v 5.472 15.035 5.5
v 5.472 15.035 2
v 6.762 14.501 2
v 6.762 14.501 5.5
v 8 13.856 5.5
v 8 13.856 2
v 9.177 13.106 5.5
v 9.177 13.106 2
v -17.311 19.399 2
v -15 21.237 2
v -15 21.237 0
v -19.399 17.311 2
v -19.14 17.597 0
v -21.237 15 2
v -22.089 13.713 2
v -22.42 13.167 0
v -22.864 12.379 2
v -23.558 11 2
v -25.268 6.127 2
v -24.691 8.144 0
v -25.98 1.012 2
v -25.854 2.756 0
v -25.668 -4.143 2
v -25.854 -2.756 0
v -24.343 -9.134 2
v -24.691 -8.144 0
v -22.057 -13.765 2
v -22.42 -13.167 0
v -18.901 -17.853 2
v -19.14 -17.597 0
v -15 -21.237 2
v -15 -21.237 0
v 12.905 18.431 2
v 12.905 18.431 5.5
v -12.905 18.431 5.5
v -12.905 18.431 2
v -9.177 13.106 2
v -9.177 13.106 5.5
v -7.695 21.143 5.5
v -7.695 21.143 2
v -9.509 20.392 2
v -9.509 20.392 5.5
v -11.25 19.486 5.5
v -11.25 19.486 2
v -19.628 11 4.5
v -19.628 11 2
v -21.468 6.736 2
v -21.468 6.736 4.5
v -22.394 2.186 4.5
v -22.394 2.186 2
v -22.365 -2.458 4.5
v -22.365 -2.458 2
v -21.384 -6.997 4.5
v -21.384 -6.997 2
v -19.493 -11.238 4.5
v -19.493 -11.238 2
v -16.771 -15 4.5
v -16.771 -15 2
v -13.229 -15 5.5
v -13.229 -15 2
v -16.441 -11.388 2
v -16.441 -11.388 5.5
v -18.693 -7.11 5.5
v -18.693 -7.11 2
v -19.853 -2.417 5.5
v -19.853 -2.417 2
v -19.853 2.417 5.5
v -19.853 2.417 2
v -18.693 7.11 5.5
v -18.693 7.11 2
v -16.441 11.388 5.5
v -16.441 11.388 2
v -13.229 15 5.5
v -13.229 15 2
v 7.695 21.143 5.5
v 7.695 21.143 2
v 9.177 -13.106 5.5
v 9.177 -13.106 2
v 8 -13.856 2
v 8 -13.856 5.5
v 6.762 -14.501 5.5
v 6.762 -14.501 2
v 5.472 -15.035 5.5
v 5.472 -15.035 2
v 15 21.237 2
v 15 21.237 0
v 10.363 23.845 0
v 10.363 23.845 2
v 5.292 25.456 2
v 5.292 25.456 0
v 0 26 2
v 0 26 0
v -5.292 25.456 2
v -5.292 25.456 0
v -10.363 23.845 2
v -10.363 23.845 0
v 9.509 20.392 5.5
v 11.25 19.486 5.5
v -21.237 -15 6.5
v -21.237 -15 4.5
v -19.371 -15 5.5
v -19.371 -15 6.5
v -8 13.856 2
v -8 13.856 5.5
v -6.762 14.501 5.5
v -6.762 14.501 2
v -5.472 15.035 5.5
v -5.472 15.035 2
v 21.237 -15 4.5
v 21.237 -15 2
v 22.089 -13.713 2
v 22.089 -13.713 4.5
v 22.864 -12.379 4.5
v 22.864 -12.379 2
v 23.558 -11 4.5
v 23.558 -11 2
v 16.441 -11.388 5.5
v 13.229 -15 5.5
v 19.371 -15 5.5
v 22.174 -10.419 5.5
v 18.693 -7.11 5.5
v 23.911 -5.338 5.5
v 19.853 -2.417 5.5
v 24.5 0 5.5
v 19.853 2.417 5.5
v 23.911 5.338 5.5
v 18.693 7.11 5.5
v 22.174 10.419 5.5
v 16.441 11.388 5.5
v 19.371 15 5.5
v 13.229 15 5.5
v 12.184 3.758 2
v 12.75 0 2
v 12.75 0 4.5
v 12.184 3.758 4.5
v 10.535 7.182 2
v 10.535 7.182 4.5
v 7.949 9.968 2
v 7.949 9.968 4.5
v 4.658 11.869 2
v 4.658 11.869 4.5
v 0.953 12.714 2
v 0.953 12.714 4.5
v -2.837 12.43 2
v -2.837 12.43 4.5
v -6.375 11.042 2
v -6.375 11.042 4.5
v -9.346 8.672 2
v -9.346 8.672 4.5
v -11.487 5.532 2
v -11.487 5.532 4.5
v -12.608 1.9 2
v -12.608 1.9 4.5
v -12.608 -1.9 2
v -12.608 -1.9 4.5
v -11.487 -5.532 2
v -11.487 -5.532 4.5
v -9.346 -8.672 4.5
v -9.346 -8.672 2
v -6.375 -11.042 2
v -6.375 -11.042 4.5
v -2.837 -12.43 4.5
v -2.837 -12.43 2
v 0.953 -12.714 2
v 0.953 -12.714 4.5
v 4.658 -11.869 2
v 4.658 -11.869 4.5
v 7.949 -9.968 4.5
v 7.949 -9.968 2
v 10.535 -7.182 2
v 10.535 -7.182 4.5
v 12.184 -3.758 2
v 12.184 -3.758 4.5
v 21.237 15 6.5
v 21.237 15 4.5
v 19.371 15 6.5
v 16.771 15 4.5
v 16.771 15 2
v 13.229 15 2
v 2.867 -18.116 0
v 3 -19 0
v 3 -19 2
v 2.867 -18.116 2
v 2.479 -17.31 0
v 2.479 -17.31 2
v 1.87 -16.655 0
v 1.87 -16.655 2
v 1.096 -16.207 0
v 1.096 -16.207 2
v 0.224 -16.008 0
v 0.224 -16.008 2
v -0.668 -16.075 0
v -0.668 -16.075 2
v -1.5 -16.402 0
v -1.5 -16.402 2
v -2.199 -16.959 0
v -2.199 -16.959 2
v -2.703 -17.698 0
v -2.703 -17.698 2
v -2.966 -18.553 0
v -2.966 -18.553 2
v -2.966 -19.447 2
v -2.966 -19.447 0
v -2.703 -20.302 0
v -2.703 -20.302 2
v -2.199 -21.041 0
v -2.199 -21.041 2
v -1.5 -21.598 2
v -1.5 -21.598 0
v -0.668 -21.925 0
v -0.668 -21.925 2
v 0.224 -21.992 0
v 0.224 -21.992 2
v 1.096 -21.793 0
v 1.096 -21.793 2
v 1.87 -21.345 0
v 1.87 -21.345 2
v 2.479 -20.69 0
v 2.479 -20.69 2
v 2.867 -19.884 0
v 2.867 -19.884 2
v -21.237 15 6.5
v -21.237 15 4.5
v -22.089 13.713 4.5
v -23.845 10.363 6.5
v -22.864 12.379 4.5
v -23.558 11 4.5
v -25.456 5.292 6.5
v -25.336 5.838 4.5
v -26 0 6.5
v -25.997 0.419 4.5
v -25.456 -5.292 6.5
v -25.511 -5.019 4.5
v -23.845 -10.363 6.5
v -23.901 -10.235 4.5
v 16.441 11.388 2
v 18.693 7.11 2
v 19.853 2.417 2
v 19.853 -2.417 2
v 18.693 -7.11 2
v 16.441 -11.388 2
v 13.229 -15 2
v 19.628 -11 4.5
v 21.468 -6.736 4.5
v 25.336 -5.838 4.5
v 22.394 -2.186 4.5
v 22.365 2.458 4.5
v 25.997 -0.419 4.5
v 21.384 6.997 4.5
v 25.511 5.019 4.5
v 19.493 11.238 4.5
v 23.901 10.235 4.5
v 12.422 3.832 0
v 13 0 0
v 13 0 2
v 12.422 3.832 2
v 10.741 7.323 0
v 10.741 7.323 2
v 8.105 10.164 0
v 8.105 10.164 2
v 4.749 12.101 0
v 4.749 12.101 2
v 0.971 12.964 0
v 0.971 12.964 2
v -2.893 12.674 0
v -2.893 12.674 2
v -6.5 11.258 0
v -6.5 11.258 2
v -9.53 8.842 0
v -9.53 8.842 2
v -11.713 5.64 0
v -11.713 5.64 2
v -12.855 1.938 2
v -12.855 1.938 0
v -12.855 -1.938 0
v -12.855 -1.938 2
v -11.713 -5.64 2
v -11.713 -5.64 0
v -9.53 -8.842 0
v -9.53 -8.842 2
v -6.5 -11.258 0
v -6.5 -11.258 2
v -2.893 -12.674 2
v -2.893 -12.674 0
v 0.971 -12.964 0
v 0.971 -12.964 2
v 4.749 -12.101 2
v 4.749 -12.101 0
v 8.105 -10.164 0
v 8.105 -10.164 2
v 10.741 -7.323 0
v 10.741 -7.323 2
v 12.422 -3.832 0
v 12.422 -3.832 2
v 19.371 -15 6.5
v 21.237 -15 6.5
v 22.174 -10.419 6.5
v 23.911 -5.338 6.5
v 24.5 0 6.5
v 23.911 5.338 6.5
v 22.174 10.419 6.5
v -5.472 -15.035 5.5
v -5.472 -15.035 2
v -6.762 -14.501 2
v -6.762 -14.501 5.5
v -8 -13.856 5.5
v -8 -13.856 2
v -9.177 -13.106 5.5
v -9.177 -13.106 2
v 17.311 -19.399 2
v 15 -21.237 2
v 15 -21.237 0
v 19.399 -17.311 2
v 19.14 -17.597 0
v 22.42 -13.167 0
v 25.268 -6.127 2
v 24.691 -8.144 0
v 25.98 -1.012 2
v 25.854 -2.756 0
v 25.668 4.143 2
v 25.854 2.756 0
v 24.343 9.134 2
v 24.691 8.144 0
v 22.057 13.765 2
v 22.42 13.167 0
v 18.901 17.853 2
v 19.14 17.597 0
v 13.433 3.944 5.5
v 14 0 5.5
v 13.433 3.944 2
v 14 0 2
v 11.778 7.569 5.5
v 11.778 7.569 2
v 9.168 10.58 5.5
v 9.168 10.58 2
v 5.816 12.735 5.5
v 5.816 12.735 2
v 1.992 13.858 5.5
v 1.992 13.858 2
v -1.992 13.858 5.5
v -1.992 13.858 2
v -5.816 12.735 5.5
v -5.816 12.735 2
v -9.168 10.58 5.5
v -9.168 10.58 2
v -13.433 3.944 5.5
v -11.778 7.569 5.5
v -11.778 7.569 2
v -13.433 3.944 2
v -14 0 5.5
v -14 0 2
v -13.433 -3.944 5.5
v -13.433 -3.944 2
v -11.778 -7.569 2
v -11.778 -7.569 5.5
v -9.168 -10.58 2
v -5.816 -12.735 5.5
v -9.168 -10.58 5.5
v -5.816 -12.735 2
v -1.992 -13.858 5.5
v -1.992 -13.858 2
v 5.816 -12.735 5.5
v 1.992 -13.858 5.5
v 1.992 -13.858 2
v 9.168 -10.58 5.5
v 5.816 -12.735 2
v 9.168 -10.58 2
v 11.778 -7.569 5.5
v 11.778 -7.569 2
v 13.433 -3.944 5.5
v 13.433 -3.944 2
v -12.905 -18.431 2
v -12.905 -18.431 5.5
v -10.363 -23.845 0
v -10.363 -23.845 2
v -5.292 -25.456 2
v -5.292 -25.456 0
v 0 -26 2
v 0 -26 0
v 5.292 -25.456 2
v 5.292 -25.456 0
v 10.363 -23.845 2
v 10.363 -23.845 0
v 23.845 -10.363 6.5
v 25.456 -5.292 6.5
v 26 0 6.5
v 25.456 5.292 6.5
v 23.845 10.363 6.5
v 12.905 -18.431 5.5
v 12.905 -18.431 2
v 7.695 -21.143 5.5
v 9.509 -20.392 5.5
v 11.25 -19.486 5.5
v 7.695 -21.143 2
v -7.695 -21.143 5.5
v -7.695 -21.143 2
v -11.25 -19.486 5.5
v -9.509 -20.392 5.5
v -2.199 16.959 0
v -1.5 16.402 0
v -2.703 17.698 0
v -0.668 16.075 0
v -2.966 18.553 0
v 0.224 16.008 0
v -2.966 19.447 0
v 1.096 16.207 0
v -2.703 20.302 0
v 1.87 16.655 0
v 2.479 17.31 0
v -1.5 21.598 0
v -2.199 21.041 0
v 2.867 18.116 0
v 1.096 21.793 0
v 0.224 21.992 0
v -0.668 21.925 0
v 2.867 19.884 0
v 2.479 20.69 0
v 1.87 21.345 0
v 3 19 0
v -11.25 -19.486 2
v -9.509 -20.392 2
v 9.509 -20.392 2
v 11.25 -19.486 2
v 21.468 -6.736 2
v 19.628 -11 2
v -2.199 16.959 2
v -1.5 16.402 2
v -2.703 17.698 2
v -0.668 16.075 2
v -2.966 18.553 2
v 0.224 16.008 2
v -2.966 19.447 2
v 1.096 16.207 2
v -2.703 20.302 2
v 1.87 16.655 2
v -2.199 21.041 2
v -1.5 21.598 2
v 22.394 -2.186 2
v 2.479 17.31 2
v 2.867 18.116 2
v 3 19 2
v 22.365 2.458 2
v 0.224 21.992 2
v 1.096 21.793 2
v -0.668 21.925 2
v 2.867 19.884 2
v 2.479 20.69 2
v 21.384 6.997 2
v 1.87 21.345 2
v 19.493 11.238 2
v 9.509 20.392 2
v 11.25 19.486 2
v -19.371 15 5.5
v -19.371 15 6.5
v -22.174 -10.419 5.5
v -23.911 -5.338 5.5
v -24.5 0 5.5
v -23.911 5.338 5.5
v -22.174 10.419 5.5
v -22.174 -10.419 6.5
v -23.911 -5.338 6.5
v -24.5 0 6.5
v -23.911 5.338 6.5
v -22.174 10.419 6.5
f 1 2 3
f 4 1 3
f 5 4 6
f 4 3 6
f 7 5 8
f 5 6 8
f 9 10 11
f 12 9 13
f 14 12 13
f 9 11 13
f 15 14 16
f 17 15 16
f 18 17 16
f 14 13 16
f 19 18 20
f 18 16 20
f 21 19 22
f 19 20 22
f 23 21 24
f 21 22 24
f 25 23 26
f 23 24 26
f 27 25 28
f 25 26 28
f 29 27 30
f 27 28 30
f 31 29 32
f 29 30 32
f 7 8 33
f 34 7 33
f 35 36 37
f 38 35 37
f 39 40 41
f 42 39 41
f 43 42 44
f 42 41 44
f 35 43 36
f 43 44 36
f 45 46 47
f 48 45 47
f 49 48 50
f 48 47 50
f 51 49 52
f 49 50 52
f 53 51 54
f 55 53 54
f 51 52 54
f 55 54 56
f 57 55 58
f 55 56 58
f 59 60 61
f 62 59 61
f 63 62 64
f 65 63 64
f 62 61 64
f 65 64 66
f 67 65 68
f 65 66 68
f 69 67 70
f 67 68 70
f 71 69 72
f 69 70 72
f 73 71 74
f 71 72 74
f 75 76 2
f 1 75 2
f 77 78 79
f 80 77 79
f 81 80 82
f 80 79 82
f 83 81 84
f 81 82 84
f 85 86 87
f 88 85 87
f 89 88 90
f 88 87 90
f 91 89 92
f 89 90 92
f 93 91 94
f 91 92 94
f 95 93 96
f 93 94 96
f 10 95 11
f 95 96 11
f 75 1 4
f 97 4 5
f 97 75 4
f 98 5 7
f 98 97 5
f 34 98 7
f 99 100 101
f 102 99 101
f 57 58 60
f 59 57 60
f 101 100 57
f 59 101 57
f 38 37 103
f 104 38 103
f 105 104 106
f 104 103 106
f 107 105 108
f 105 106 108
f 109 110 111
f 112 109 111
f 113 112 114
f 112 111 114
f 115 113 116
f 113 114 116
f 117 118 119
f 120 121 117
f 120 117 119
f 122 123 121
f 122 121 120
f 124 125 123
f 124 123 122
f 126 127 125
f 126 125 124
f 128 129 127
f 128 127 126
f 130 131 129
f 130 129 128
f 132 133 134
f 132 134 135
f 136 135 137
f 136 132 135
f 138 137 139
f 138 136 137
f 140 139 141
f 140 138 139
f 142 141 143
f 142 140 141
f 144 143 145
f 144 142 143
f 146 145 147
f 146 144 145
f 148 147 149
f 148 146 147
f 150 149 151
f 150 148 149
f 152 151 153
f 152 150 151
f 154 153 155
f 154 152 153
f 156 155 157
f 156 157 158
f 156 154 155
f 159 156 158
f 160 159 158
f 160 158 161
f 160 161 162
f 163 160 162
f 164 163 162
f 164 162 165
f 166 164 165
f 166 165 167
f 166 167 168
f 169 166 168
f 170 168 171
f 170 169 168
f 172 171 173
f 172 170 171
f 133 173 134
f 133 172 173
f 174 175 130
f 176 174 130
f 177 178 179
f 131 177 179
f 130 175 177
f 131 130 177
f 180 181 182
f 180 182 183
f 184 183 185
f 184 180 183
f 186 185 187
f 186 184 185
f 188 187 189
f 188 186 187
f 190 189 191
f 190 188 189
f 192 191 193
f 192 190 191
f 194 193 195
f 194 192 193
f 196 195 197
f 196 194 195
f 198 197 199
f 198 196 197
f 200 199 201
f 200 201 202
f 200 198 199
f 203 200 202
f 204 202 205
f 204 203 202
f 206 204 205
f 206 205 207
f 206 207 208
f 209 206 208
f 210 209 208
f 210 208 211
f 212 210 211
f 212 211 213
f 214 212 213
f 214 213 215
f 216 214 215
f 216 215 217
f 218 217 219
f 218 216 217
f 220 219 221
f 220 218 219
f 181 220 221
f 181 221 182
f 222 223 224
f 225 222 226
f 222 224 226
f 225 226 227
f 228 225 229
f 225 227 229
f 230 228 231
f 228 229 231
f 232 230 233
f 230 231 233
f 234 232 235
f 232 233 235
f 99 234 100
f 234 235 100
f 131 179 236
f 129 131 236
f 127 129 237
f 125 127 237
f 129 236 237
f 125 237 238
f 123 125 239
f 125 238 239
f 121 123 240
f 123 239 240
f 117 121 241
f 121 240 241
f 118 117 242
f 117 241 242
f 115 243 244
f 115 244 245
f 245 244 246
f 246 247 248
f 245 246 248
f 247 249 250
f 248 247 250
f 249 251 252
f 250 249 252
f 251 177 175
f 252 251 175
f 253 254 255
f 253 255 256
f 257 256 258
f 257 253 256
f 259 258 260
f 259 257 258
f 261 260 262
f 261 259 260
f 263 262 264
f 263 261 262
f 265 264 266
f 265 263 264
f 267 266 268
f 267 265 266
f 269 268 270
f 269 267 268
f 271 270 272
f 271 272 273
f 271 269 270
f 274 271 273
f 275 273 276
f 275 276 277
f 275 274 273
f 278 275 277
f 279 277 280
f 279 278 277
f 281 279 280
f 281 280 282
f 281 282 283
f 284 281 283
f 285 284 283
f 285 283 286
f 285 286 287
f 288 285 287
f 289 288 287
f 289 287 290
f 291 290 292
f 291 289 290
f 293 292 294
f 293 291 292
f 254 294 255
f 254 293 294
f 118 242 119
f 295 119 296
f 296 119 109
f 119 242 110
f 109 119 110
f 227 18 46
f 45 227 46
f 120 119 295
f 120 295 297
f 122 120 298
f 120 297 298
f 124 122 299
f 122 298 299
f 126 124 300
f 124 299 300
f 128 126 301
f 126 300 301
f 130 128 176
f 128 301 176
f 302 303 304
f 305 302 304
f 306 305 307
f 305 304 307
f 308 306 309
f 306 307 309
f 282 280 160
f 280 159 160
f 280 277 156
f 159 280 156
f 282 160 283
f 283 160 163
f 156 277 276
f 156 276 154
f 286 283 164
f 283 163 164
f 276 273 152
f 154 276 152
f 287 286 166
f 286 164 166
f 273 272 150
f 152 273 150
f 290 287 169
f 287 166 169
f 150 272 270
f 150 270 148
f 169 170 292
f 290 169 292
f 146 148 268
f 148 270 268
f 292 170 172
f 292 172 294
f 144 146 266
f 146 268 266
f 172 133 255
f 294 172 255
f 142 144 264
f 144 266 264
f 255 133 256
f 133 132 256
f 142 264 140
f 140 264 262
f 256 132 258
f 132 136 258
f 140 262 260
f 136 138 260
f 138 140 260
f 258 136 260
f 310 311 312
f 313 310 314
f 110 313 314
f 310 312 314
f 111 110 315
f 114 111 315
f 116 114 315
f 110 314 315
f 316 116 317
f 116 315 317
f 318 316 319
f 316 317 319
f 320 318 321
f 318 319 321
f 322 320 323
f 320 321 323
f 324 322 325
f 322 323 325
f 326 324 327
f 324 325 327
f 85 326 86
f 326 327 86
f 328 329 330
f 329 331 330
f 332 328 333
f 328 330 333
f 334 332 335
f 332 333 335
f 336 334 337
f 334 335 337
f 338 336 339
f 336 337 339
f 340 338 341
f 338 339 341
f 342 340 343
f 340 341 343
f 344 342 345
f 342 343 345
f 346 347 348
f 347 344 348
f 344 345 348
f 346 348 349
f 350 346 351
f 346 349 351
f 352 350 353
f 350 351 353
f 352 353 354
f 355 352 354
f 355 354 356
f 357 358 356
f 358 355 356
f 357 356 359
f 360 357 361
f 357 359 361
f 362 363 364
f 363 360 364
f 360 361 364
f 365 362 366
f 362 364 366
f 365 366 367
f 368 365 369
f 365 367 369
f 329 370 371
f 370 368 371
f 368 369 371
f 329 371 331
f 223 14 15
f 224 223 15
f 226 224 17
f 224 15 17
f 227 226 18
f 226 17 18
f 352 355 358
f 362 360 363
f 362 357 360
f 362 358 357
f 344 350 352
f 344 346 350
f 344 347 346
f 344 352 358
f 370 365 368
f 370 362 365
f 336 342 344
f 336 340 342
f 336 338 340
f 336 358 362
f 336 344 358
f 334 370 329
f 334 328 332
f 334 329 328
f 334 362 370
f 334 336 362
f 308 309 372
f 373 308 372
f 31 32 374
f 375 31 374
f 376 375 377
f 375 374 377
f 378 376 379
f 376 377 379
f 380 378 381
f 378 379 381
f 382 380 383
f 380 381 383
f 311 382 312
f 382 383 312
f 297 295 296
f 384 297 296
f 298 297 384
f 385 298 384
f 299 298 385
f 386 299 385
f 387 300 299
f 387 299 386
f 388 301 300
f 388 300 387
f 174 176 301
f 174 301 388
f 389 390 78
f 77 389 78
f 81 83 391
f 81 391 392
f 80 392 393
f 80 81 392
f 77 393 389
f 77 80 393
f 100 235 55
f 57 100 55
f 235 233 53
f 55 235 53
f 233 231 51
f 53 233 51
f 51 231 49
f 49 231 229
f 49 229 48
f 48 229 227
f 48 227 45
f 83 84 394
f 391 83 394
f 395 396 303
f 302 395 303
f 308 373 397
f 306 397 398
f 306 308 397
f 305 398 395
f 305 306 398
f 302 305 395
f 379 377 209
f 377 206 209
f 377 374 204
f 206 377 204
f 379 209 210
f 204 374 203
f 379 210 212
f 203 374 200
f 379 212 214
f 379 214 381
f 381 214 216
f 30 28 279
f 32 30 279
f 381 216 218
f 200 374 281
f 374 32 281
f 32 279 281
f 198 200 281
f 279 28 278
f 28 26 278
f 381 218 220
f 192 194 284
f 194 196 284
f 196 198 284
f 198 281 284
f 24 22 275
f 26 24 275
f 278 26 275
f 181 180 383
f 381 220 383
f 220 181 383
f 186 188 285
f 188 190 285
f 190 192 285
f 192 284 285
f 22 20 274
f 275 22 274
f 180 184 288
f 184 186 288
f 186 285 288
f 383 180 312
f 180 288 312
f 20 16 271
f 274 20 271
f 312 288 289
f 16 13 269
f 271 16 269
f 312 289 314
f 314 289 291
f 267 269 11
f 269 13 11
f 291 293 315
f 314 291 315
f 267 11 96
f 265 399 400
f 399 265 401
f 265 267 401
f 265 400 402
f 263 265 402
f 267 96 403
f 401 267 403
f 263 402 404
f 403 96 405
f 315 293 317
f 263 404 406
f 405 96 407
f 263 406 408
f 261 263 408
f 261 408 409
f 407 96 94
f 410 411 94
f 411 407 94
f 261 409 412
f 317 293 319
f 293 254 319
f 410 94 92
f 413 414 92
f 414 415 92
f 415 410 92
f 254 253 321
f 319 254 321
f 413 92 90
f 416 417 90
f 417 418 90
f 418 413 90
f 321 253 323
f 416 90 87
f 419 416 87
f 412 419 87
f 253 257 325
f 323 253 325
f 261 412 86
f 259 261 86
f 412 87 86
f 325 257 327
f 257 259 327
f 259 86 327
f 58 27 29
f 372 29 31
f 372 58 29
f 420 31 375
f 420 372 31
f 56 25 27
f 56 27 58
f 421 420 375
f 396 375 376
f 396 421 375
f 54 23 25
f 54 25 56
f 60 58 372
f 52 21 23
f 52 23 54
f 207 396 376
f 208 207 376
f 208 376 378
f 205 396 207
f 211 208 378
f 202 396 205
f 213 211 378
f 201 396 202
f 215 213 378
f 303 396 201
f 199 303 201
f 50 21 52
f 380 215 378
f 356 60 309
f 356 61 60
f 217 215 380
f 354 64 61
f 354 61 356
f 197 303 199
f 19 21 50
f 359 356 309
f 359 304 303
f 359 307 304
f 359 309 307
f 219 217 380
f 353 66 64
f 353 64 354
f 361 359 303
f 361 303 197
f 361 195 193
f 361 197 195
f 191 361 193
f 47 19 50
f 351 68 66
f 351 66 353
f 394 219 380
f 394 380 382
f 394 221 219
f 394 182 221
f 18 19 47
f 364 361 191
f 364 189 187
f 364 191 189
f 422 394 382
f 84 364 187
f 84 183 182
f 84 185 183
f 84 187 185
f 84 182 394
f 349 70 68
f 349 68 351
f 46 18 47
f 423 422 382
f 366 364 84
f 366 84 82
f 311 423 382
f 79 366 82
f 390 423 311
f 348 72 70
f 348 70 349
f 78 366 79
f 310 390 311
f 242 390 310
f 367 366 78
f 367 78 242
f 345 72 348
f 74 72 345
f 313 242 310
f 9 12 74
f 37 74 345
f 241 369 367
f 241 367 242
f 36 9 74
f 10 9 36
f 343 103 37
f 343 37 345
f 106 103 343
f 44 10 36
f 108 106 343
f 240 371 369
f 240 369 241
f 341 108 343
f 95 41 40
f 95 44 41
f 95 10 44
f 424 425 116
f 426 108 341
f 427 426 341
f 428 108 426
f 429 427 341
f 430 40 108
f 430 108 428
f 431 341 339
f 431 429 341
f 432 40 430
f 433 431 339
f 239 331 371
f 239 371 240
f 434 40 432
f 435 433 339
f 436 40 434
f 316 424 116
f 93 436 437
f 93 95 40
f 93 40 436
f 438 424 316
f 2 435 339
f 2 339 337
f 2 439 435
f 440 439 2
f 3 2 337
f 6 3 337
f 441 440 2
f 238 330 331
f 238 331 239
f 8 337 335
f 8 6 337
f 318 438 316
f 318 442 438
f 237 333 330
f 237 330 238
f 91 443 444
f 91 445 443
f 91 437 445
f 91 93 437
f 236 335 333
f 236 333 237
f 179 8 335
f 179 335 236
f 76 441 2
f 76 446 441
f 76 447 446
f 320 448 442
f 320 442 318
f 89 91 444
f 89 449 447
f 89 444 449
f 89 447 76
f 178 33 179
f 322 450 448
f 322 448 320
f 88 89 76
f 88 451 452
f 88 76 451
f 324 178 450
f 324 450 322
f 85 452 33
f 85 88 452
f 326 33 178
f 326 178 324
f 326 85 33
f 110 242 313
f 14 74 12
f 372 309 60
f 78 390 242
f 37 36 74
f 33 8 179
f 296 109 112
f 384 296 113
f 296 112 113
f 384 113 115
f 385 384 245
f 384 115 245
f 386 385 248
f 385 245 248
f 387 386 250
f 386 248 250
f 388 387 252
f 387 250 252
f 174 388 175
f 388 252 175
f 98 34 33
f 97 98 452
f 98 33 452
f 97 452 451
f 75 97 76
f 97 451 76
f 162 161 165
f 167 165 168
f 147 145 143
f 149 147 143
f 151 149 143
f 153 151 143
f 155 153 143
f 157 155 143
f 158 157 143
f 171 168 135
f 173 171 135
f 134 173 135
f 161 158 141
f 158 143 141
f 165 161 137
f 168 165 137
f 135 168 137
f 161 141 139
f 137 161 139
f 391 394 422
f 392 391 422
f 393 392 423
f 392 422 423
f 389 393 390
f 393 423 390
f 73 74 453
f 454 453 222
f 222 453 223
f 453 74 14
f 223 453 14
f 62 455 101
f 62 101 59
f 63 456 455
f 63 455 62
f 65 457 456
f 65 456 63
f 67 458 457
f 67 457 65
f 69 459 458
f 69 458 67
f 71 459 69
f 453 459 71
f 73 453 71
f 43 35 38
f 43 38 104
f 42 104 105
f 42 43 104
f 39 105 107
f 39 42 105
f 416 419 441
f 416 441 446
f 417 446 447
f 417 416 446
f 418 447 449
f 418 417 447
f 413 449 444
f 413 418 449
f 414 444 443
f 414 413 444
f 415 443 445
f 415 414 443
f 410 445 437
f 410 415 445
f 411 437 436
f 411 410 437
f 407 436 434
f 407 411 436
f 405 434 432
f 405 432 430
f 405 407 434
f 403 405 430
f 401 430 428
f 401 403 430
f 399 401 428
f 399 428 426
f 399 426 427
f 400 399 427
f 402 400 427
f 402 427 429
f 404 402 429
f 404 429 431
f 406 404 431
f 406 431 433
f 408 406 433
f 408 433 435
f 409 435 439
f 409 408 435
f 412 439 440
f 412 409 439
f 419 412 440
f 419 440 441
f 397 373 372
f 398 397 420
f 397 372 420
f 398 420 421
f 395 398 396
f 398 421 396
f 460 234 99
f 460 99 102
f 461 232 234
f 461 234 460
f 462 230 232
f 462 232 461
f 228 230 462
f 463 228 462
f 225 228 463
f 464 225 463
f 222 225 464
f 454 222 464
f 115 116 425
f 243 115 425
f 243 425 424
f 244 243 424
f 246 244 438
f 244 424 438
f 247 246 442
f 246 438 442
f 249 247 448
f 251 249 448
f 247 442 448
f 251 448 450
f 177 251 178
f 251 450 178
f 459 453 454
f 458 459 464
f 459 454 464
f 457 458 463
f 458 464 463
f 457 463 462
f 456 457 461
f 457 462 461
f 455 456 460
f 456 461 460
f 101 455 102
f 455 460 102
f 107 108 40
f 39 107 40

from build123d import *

# Parameters (mm, degrees)
F0_R      = 3
F0_R_2    = 13
F1_DEPTH  = 2
F2_R      = 14
F2_R_2    = 12.75
F3_DEPTH  = 2.5
F4_R      = 14
F5_DEPTH  = 2
F7_DEPTH  = 2.5
F9_DEPTH  = 2
F11_DEPTH = 4.5
F12_R     = 24.5
F13_DEPTH = 1


with BuildPart() as f1:
    # F0 (on Top) → F1 (new body)
    with BuildSketch(Plane.XY):
        with BuildLine():
            ThreePointArc((-15, 21.236761), (-26, 0), (-15, -21.236761))
            ThreePointArc((-15, -21.236761), (0, -26), (15, -21.236761))
            ThreePointArc((15, -21.236761), (26, 0), (15, 21.236761))
            ThreePointArc((15, 21.236761), (0, 26), (-15, 21.236761))
        make_face()
        with Locations((0, -19)):
            Circle(F0_R, mode=Mode.SUBTRACT)
        Circle(F0_R_2, mode=Mode.SUBTRACT)
        with Locations((0, 19)):
            Circle(F0_R, mode=Mode.SUBTRACT)
    extrude(amount=F1_DEPTH)

    # F2 (on face) → F3 (join)
    with BuildSketch(Plane.XY.offset(2)):
        Circle(F2_R)
        Circle(F2_R_2, mode=Mode.SUBTRACT)
    extrude(amount=F3_DEPTH)

    # F4 (on face) → F5 (join)
    with BuildSketch(Plane.XY.offset(4.5)):
        Circle(F4_R)
    extrude(amount=F5_DEPTH)

    # F6 (on face) → F7 (join)
    with BuildSketch(Plane.XY.offset(2)):
        with BuildLine():
            Line((23.558438, -11), (19.627786, -11))
            ThreePointArc((19.627786, -11), (22.365353, 2.457846), (16.77051, 15))
            Line((16.77051, 15), (13.228757, 15))
            ThreePointArc((13.228757, 15), (20, 0), (13.228757, -15))
            Line((13.228757, -15), (16.77051, -15))
            Line((16.77051, -15), (21.236761, -15))
            ThreePointArc((21.236761, -15), (22.486717, -13.051726), (23.558438, -11))
        make_face()
        with BuildLine():
            Line((-13.228757, 15), (-16.77051, 15))
            Line((-16.77051, 15), (-21.236761, 15))
            ThreePointArc((-21.236761, 15), (-22.486717, 13.051726), (-23.558438, 11))
            Line((-23.558438, 11), (-19.627786, 11))
            ThreePointArc((-19.627786, 11), (-22.365353, -2.457846), (-16.77051, -15))
            Line((-16.77051, -15), (-13.228757, -15))
            ThreePointArc((-13.228757, -15), (-20, 0), (-13.228757, 15))
        make_face()
    extrude(amount=F7_DEPTH)

    # F8 (on face) → F9 (join)
    with BuildSketch(Plane.XY.offset(4.5)):
        with BuildLine():
            Line((-13.228757, 15), (-21.236761, 15))
            ThreePointArc((-21.236761, 15), (-26, 0), (-21.236761, -15))
            Line((-21.236761, -15), (-13.228757, -15))
            ThreePointArc((-13.228757, -15), (-20, 0), (-13.228757, 15))
        make_face()
        with BuildLine():
            ThreePointArc((21.236761, -15), (26, 0), (21.236761, 15))
            Line((21.236761, 15), (13.228757, 15))
            ThreePointArc((13.228757, 15), (20, 0), (13.228757, -15))
            Line((13.228757, -15), (21.236761, -15))
        make_face()
    extrude(amount=F9_DEPTH)

    # F10 (on face) → F11 (join)
    with BuildSketch(Plane.XY.offset(2)):
        with BuildLine():
            ThreePointArc((-9.177223, 13.106433), (-7.387978, 14.192173), (-5.472322, 15.035082))
            Line((-5.472322, 15.035082), (-7.695453, 21.143084))
            ThreePointArc((-7.695453, 21.143084), (-10.389344, 19.957744), (-12.90547, 18.430921))
            Line((-12.90547, 18.430921), (-9.177223, 13.106433))
        make_face()
        with BuildLine():
            Line((7.695453, 21.143084), (5.472322, 15.035082))
            ThreePointArc((5.472322, 15.035082), (7.387978, 14.192173), (9.177223, 13.106433))
            Line((9.177223, 13.106433), (12.90547, 18.430921))
            ThreePointArc((12.90547, 18.430921), (10.389344, 19.957744), (7.695453, 21.143084))
        make_face()
        with BuildLine():
            Line((-7.695453, -21.143084), (-5.472322, -15.035082))
            ThreePointArc((-5.472322, -15.035082), (-7.387978, -14.192173), (-9.177223, -13.106433))
            Line((-9.177223, -13.106433), (-12.90547, -18.430921))
            ThreePointArc((-12.90547, -18.430921), (-10.389344, -19.957744), (-7.695453, -21.143084))
        make_face()
        with BuildLine():
            ThreePointArc((9.177223, -13.106433), (7.387978, -14.192173), (5.472322, -15.035082))
            Line((5.472322, -15.035082), (7.695453, -21.143084))
            ThreePointArc((7.695453, -21.143084), (10.389344, -19.957744), (12.90547, -18.430921))
            Line((12.90547, -18.430921), (9.177223, -13.106433))
        make_face()
    extrude(amount=F11_DEPTH)

    # F12 (on face) → F13 (cut)
    with BuildSketch(Plane.XY.offset(6.5)):
        Circle(F12_R)
    extrude(amount=-F13_DEPTH, mode=Mode.SUBTRACT)


solid = f1.part
